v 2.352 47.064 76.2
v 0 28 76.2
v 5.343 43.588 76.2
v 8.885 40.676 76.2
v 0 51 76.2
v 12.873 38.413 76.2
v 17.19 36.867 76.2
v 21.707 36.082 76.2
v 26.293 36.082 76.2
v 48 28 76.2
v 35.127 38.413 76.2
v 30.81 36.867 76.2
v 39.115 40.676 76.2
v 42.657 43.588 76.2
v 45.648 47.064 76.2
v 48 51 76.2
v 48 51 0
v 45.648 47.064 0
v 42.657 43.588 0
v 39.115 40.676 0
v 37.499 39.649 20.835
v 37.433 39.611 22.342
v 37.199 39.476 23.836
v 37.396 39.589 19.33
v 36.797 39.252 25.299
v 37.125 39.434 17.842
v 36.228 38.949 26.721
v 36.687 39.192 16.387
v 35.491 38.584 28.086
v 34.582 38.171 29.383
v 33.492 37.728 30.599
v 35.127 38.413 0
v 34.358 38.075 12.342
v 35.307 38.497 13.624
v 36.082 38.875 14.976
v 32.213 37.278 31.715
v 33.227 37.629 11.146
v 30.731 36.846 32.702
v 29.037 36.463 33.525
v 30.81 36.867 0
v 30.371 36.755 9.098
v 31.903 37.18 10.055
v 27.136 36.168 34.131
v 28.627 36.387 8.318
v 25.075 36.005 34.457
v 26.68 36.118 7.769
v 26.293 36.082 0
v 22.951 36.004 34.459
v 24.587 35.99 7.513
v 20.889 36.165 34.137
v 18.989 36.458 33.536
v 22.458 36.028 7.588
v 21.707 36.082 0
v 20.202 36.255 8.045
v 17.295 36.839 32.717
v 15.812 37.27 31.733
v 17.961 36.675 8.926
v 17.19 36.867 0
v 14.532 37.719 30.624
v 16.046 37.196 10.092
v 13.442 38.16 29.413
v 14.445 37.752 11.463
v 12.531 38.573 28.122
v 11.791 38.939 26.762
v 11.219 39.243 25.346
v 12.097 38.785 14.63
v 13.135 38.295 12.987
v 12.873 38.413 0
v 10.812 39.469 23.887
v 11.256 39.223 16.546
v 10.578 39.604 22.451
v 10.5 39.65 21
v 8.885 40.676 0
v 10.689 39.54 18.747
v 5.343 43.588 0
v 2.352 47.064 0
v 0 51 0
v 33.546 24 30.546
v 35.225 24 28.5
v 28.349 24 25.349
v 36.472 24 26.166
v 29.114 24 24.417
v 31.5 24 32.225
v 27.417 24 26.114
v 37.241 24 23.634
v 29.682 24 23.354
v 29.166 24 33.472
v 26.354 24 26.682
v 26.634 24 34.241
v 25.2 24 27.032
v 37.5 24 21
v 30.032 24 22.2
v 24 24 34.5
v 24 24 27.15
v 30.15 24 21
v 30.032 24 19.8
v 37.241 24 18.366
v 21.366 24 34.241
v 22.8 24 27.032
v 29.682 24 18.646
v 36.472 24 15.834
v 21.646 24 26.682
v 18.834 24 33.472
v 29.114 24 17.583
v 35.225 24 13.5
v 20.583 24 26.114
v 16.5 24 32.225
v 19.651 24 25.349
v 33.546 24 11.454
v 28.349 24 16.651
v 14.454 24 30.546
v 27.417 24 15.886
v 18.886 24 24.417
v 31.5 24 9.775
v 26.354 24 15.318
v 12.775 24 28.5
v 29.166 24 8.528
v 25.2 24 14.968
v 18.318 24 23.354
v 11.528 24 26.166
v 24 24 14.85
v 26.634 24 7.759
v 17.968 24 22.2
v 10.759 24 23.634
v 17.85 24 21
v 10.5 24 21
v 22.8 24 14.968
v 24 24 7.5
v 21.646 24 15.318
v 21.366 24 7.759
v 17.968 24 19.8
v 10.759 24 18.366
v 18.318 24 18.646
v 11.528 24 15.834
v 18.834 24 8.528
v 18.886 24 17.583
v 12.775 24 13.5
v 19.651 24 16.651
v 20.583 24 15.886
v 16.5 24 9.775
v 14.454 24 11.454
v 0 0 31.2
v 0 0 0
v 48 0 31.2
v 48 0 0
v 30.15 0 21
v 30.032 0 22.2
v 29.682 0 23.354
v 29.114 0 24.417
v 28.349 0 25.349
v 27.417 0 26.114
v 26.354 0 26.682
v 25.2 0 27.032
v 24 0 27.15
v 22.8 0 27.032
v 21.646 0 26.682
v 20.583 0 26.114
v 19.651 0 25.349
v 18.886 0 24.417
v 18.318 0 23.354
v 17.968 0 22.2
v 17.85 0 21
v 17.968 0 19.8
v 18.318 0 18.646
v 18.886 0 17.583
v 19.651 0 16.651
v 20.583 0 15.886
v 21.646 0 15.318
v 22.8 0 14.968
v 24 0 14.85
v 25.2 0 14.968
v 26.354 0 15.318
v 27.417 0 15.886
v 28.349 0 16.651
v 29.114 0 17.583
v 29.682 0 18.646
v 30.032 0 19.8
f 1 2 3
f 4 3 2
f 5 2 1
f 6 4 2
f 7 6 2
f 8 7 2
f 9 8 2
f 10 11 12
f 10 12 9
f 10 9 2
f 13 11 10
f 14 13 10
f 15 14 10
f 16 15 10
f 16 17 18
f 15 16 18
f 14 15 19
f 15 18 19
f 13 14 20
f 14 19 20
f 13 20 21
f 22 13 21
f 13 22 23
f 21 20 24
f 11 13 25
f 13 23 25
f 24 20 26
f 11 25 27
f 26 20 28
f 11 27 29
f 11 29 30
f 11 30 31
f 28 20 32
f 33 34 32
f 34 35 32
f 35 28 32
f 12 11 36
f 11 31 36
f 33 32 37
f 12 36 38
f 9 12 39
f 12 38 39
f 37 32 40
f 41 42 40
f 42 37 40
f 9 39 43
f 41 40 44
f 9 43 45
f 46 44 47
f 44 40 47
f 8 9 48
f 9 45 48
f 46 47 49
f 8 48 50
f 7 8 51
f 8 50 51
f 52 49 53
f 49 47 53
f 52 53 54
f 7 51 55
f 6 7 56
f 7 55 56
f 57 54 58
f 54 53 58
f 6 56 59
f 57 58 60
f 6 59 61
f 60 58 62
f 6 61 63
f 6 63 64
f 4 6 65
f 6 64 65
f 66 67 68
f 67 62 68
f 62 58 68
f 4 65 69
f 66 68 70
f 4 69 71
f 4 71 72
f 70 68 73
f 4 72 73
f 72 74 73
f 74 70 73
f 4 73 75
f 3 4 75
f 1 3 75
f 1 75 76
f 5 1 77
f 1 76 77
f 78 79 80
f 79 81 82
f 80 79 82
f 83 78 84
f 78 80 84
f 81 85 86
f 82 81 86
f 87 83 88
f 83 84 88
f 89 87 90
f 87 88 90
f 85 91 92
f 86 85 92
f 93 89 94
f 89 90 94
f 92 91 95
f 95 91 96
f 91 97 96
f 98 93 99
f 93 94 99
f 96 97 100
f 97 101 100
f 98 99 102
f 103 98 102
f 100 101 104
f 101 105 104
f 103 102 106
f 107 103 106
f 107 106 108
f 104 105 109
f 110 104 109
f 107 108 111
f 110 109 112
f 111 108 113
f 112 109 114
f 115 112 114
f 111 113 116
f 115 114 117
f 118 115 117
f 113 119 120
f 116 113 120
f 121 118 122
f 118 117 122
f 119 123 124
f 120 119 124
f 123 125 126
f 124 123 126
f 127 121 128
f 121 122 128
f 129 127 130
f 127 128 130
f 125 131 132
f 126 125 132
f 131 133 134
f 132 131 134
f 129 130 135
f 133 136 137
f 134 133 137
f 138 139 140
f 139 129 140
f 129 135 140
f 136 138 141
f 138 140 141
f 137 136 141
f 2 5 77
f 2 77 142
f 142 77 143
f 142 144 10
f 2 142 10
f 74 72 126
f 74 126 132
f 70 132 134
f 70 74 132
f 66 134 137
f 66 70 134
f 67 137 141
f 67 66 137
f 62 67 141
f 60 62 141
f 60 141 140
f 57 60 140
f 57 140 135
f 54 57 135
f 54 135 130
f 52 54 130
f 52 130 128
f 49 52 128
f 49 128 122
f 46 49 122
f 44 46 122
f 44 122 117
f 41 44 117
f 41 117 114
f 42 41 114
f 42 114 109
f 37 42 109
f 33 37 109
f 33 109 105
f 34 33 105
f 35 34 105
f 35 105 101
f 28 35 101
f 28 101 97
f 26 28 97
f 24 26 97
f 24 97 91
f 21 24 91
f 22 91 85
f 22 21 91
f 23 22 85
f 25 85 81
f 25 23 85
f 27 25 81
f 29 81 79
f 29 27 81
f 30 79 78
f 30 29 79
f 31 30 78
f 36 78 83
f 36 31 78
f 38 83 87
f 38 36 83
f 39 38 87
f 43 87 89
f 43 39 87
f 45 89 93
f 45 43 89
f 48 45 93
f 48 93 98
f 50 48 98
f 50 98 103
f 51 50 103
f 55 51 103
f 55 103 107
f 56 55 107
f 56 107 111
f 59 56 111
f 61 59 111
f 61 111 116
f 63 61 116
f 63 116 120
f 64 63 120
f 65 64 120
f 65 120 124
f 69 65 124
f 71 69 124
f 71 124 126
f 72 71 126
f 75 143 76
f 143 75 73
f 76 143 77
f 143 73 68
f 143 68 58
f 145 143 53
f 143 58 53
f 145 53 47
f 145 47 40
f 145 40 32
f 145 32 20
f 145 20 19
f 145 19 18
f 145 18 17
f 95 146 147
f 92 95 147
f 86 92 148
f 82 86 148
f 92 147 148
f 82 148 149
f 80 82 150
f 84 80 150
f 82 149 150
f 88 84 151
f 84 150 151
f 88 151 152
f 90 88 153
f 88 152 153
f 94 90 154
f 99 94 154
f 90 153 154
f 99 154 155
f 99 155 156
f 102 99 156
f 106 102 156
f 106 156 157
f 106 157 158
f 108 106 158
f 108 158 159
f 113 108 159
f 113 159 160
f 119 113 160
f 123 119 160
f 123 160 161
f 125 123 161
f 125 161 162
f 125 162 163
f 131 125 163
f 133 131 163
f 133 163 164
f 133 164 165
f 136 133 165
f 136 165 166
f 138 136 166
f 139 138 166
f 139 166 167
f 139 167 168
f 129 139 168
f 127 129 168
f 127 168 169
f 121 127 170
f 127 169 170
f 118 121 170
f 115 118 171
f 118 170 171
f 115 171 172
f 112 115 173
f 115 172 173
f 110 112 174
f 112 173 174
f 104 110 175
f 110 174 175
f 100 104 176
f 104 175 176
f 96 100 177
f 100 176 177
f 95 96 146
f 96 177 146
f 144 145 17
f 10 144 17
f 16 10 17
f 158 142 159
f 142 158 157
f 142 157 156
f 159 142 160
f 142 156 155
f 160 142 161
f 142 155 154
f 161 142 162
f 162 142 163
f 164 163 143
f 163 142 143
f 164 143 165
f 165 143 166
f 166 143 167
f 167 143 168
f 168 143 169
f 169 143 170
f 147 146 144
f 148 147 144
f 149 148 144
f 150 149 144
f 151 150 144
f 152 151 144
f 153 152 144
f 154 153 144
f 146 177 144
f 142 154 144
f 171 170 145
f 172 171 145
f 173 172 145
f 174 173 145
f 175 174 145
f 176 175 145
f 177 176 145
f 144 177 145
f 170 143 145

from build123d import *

# Parameters (mm, degrees)
BOSS_EXTRUDE1_DEPTH = 76.2
CUT_EXTRUDE1_DEPTH  = 49.2
SKETCH5_R           = 6.15
CUT_EXTRUDE2_DEPTH  = 44
SKETCH6_R           = 13.5
CUT_EXTRUDE3_DEPTH  = 27


with BuildPart() as part:
    # Sketch2 → Boss-Extrude1 (new body)
    with BuildSketch(Plane.XY):
        with BuildLine():
            Line((0, 51), (0, 0))
            Line((0, 0), (48, 0))
            Line((48, 0), (48, 51))
            ThreePointArc((48, 51), (24, 35.983160819), (0, 51))
        make_face()
    extrude(amount=BOSS_EXTRUDE1_DEPTH)

    # Sketch3 → Cut-Extrude1 (cut)
    with BuildSketch(Plane.ZY.offset(-48)):
        Polygon((76.2, 28), (76.2, 0), (31.2, 0), align=None)
    extrude(amount=CUT_EXTRUDE1_DEPTH, mode=Mode.SUBTRACT)

    # Sketch5 → Cut-Extrude2 (cut)
    with BuildSketch(Plane.XZ):
        with Locations((24, 21)):
            Circle(SKETCH5_R)
    extrude(amount=-CUT_EXTRUDE2_DEPTH, mode=Mode.SUBTRACT)

    # Sketch6 → Cut-Extrude3 (cut)
    with BuildSketch(Plane(origin=(0, 51, 0), x_dir=(-1, 0, 0), z_dir=(0, -1, 0))):
        with Locations((-24, -21)):
            Circle(SKETCH6_R)
    extrude(amount=CUT_EXTRUDE3_DEPTH, mode=Mode.SUBTRACT)


solid = part.part
